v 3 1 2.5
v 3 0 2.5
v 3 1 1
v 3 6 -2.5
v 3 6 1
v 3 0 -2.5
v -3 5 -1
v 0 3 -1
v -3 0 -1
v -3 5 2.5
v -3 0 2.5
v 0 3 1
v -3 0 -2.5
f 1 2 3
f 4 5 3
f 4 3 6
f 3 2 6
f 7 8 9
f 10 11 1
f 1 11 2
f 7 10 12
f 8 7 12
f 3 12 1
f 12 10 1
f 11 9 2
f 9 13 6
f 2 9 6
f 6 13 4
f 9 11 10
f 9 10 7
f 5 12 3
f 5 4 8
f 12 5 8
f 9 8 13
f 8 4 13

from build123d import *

# Parameters (mm, degrees)
SKETCH1_W           = 6
SKETCH1_H           = 5
BOSS_EXTRUDE1_DEPTH = 6
CUT_EXTRUDE1_DEPTH  = 3.5
CUT_EXTRUDE2_DEPTH  = 1.5
CUT_EXTRUDE3_DEPTH  = 3.5
CUT_EXTRUDE4_DEPTH  = 1.5


with BuildPart() as part:
    # Sketch1 → Boss-Extrude1 (new body)
    with BuildSketch(Plane(origin=(0, 0, 0), x_dir=(1, 0, 0), z_dir=(0, 1, 0))):
        Rectangle(SKETCH1_W, SKETCH1_H)
    extrude(amount=BOSS_EXTRUDE1_DEPTH)

    # Sketch2 → Cut-Extrude1 (cut)
    with BuildSketch(Plane.XY.offset(2.5)):
        Polygon((-3, 5), (0, 3), (0, 6), (-3, 6), align=None)
    extrude(amount=-CUT_EXTRUDE1_DEPTH, mode=Mode.SUBTRACT)

    # Sketch4 → Cut-Extrude2 (cut)
    with BuildSketch(Plane.XY.offset(2.5)):
        Polygon((0, 3), (3, 1), (3, 6), (0, 6), align=None)
    extrude(amount=-CUT_EXTRUDE2_DEPTH, mode=Mode.SUBTRACT)

    # Sketch5 → Cut-Extrude3 (cut)
    with BuildSketch(Plane(origin=(0, 0, -2.5), x_dir=(-1, 0, 0), z_dir=(0, 0, -1))):
        Polygon((0, 6), (-3, 6), (0, 3), align=None)
    extrude(amount=-CUT_EXTRUDE3_DEPTH, mode=Mode.SUBTRACT)

    # Sketch6 → Cut-Extrude4 (cut)
    with BuildSketch(Plane(origin=(0, 0, -2.5), x_dir=(-1, 0, 0), z_dir=(0, 0, -1))):
        Polygon((0, 3), (3, 0), (3, 6), (0, 6), align=None)
    extrude(amount=-CUT_EXTRUDE4_DEPTH, mode=Mode.SUBTRACT)


solid = part.part
